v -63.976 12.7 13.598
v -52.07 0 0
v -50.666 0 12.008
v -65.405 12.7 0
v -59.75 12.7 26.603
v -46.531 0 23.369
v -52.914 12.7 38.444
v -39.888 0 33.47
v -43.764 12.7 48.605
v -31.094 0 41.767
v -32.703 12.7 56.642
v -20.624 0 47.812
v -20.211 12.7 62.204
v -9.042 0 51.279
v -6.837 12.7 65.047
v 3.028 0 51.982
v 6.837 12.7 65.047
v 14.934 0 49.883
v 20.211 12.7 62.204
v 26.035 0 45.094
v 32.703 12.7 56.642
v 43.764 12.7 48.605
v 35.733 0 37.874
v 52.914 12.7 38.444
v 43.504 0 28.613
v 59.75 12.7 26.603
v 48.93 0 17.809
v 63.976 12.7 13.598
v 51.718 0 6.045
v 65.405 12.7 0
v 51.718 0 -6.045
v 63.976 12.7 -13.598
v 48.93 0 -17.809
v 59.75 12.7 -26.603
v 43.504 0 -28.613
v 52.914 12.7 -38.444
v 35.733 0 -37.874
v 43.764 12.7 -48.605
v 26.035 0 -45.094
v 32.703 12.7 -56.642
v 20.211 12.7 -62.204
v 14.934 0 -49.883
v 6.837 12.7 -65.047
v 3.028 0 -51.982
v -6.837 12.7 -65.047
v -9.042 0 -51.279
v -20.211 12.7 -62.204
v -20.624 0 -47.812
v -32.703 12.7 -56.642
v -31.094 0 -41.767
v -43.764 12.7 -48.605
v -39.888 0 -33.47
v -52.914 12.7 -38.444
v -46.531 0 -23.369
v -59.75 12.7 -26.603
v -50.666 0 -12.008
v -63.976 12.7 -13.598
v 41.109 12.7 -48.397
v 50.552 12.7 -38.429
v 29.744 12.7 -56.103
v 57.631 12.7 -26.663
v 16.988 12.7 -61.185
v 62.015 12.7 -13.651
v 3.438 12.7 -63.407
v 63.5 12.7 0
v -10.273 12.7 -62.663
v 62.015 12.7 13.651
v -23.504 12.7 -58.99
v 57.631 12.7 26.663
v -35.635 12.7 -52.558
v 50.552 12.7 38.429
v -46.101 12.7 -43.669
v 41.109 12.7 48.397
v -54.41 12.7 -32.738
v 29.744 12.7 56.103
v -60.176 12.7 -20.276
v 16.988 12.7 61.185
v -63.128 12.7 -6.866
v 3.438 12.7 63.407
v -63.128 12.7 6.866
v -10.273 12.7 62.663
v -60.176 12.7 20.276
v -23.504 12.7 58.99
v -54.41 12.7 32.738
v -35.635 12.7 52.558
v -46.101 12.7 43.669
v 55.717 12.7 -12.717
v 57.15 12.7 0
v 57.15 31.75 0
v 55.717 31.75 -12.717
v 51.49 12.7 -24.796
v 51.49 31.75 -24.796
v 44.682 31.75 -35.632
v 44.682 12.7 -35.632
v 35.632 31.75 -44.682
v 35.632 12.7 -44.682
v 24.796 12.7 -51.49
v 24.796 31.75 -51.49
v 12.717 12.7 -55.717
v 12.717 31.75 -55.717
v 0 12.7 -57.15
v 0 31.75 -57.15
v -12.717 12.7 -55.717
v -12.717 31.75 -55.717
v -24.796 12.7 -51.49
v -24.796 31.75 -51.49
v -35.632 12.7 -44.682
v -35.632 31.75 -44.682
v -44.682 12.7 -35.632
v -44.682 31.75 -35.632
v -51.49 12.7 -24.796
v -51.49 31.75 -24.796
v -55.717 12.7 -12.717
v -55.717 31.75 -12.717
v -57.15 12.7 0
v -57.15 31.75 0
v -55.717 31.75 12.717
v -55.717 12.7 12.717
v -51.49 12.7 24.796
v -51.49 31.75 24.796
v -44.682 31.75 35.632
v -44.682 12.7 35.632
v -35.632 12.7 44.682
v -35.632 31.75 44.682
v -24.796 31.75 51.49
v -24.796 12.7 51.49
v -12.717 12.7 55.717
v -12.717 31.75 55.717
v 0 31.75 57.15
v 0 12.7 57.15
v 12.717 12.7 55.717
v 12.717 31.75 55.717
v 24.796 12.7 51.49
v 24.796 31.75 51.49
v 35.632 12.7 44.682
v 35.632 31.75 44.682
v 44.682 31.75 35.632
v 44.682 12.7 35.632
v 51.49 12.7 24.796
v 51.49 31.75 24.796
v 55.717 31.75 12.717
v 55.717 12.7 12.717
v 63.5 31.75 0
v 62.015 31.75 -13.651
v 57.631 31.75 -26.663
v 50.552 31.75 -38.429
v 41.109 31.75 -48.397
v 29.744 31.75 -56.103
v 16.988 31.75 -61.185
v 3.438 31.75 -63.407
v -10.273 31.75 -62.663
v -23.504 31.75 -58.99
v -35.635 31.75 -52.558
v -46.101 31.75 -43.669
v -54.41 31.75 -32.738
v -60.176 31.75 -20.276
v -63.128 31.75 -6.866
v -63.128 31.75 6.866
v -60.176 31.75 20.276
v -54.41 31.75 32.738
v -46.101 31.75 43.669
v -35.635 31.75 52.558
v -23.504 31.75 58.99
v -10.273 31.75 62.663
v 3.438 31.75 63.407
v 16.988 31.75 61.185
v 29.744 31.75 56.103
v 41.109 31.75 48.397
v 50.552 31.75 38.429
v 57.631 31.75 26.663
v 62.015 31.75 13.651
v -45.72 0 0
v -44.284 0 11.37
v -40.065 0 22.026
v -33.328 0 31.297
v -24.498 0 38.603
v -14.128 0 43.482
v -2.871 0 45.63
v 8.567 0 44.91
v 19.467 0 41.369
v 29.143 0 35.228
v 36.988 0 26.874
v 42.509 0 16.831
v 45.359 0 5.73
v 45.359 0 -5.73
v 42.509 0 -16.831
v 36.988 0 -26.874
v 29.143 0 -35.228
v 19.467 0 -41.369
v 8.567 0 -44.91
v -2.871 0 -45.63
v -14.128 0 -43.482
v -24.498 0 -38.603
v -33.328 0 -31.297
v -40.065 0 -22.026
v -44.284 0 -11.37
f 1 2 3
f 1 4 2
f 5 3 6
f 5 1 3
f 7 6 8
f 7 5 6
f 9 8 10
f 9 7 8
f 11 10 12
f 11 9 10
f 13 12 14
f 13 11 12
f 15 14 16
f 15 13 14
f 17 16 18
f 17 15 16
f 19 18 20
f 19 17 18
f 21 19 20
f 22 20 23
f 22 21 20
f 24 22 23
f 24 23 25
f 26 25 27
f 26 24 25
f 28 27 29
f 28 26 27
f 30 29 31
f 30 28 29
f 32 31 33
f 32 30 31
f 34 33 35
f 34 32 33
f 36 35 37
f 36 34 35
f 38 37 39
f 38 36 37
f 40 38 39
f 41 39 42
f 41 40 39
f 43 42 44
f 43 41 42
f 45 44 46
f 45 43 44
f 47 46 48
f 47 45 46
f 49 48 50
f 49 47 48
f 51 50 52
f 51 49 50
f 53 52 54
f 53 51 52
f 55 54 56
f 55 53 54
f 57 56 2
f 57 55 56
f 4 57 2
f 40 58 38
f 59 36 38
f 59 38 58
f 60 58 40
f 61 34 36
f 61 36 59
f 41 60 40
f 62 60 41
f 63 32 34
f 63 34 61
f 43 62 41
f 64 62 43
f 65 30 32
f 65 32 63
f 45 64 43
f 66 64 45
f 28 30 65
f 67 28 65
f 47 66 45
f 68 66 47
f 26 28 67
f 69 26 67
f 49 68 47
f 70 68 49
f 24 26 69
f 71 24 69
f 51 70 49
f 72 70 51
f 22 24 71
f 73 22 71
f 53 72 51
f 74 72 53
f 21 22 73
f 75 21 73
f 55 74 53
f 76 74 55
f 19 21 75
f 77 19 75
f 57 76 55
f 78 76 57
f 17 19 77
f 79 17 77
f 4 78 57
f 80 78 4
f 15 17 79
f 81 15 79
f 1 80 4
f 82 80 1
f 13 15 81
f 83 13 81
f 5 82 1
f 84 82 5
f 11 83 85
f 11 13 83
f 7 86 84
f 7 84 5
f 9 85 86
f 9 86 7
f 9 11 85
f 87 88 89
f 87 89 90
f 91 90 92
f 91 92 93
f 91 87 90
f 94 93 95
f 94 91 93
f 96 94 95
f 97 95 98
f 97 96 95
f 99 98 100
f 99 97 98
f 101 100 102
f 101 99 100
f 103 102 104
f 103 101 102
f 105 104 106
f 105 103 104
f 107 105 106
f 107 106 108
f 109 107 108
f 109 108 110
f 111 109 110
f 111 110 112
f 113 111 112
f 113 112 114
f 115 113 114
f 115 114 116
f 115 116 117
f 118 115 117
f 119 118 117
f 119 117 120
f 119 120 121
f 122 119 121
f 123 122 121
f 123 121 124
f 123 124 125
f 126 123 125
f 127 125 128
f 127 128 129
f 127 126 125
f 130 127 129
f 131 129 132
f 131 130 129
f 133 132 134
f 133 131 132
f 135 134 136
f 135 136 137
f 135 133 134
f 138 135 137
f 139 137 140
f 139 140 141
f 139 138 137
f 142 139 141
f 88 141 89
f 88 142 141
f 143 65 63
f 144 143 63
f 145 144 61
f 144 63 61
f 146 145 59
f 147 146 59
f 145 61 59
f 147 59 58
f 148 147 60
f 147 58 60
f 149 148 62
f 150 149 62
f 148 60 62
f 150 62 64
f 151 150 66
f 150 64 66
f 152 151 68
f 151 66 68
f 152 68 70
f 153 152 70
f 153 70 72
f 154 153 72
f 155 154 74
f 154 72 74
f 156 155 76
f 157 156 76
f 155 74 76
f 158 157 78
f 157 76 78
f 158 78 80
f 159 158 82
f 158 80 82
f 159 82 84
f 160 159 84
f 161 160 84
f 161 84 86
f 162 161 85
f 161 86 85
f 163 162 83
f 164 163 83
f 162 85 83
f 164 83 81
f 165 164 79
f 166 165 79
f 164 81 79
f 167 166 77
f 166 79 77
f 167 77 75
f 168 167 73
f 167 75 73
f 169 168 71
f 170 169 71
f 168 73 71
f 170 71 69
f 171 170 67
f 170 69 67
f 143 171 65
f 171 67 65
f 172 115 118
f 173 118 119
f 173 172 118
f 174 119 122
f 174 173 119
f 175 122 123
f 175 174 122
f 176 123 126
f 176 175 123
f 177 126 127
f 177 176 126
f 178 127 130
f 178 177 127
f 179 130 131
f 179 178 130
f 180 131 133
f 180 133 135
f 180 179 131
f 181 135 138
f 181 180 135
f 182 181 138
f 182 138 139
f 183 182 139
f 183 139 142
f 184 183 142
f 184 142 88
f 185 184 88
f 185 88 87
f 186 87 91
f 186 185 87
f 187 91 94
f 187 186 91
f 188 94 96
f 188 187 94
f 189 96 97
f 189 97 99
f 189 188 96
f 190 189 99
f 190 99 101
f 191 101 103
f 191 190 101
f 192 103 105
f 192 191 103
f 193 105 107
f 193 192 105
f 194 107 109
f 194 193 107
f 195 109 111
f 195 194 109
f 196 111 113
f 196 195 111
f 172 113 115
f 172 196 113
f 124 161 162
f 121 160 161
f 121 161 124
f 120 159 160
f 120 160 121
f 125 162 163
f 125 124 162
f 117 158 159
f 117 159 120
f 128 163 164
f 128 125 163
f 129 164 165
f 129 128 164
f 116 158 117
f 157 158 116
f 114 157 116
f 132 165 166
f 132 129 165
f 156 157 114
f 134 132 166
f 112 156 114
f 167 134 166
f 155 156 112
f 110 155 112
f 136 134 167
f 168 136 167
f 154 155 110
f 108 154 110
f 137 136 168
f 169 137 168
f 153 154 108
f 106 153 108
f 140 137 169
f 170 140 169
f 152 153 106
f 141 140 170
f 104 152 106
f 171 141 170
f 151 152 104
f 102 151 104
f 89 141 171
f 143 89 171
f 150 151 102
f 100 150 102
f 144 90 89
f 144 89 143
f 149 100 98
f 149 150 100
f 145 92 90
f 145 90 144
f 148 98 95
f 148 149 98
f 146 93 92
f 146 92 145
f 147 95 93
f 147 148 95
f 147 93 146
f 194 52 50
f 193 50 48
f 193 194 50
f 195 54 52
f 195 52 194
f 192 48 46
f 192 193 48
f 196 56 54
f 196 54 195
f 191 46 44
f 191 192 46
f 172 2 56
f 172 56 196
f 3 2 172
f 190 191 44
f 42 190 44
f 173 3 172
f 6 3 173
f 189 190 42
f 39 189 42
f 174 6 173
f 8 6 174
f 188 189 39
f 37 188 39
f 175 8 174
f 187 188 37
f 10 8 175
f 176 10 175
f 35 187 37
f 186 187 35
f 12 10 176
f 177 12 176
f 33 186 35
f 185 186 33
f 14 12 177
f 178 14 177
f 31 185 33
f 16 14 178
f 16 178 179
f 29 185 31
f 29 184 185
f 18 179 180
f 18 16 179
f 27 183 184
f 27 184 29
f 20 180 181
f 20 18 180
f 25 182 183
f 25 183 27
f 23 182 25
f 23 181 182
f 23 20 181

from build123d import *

# Parameters (mm, degrees)
SKETCH3_R           = 63.5
SKETCH3_R_2         = 57.15
BOSS_EXTRUDE1_DEPTH = 19.05


with BuildPart() as part:
    # Sketch2 → Revolve1 (revolve)
    with BuildSketch(Plane.XY):
        Polygon((-45.72, 0), (-52.07, 0), (-65.405, 12.7), (-57.15, 12.7), align=None)
    revolve(axis=Axis((0, 0, 0), (0, 1, 0)))

    # Sketch3 → Boss-Extrude1 (add)
    with BuildSketch(Plane(origin=(0, 12.7, 0), x_dir=(1, 0, 0), z_dir=(0, 1, 0))):
        Circle(SKETCH3_R)
        Circle(SKETCH3_R_2, mode=Mode.SUBTRACT)
    extrude(amount=BOSS_EXTRUDE1_DEPTH)


solid = part.part
